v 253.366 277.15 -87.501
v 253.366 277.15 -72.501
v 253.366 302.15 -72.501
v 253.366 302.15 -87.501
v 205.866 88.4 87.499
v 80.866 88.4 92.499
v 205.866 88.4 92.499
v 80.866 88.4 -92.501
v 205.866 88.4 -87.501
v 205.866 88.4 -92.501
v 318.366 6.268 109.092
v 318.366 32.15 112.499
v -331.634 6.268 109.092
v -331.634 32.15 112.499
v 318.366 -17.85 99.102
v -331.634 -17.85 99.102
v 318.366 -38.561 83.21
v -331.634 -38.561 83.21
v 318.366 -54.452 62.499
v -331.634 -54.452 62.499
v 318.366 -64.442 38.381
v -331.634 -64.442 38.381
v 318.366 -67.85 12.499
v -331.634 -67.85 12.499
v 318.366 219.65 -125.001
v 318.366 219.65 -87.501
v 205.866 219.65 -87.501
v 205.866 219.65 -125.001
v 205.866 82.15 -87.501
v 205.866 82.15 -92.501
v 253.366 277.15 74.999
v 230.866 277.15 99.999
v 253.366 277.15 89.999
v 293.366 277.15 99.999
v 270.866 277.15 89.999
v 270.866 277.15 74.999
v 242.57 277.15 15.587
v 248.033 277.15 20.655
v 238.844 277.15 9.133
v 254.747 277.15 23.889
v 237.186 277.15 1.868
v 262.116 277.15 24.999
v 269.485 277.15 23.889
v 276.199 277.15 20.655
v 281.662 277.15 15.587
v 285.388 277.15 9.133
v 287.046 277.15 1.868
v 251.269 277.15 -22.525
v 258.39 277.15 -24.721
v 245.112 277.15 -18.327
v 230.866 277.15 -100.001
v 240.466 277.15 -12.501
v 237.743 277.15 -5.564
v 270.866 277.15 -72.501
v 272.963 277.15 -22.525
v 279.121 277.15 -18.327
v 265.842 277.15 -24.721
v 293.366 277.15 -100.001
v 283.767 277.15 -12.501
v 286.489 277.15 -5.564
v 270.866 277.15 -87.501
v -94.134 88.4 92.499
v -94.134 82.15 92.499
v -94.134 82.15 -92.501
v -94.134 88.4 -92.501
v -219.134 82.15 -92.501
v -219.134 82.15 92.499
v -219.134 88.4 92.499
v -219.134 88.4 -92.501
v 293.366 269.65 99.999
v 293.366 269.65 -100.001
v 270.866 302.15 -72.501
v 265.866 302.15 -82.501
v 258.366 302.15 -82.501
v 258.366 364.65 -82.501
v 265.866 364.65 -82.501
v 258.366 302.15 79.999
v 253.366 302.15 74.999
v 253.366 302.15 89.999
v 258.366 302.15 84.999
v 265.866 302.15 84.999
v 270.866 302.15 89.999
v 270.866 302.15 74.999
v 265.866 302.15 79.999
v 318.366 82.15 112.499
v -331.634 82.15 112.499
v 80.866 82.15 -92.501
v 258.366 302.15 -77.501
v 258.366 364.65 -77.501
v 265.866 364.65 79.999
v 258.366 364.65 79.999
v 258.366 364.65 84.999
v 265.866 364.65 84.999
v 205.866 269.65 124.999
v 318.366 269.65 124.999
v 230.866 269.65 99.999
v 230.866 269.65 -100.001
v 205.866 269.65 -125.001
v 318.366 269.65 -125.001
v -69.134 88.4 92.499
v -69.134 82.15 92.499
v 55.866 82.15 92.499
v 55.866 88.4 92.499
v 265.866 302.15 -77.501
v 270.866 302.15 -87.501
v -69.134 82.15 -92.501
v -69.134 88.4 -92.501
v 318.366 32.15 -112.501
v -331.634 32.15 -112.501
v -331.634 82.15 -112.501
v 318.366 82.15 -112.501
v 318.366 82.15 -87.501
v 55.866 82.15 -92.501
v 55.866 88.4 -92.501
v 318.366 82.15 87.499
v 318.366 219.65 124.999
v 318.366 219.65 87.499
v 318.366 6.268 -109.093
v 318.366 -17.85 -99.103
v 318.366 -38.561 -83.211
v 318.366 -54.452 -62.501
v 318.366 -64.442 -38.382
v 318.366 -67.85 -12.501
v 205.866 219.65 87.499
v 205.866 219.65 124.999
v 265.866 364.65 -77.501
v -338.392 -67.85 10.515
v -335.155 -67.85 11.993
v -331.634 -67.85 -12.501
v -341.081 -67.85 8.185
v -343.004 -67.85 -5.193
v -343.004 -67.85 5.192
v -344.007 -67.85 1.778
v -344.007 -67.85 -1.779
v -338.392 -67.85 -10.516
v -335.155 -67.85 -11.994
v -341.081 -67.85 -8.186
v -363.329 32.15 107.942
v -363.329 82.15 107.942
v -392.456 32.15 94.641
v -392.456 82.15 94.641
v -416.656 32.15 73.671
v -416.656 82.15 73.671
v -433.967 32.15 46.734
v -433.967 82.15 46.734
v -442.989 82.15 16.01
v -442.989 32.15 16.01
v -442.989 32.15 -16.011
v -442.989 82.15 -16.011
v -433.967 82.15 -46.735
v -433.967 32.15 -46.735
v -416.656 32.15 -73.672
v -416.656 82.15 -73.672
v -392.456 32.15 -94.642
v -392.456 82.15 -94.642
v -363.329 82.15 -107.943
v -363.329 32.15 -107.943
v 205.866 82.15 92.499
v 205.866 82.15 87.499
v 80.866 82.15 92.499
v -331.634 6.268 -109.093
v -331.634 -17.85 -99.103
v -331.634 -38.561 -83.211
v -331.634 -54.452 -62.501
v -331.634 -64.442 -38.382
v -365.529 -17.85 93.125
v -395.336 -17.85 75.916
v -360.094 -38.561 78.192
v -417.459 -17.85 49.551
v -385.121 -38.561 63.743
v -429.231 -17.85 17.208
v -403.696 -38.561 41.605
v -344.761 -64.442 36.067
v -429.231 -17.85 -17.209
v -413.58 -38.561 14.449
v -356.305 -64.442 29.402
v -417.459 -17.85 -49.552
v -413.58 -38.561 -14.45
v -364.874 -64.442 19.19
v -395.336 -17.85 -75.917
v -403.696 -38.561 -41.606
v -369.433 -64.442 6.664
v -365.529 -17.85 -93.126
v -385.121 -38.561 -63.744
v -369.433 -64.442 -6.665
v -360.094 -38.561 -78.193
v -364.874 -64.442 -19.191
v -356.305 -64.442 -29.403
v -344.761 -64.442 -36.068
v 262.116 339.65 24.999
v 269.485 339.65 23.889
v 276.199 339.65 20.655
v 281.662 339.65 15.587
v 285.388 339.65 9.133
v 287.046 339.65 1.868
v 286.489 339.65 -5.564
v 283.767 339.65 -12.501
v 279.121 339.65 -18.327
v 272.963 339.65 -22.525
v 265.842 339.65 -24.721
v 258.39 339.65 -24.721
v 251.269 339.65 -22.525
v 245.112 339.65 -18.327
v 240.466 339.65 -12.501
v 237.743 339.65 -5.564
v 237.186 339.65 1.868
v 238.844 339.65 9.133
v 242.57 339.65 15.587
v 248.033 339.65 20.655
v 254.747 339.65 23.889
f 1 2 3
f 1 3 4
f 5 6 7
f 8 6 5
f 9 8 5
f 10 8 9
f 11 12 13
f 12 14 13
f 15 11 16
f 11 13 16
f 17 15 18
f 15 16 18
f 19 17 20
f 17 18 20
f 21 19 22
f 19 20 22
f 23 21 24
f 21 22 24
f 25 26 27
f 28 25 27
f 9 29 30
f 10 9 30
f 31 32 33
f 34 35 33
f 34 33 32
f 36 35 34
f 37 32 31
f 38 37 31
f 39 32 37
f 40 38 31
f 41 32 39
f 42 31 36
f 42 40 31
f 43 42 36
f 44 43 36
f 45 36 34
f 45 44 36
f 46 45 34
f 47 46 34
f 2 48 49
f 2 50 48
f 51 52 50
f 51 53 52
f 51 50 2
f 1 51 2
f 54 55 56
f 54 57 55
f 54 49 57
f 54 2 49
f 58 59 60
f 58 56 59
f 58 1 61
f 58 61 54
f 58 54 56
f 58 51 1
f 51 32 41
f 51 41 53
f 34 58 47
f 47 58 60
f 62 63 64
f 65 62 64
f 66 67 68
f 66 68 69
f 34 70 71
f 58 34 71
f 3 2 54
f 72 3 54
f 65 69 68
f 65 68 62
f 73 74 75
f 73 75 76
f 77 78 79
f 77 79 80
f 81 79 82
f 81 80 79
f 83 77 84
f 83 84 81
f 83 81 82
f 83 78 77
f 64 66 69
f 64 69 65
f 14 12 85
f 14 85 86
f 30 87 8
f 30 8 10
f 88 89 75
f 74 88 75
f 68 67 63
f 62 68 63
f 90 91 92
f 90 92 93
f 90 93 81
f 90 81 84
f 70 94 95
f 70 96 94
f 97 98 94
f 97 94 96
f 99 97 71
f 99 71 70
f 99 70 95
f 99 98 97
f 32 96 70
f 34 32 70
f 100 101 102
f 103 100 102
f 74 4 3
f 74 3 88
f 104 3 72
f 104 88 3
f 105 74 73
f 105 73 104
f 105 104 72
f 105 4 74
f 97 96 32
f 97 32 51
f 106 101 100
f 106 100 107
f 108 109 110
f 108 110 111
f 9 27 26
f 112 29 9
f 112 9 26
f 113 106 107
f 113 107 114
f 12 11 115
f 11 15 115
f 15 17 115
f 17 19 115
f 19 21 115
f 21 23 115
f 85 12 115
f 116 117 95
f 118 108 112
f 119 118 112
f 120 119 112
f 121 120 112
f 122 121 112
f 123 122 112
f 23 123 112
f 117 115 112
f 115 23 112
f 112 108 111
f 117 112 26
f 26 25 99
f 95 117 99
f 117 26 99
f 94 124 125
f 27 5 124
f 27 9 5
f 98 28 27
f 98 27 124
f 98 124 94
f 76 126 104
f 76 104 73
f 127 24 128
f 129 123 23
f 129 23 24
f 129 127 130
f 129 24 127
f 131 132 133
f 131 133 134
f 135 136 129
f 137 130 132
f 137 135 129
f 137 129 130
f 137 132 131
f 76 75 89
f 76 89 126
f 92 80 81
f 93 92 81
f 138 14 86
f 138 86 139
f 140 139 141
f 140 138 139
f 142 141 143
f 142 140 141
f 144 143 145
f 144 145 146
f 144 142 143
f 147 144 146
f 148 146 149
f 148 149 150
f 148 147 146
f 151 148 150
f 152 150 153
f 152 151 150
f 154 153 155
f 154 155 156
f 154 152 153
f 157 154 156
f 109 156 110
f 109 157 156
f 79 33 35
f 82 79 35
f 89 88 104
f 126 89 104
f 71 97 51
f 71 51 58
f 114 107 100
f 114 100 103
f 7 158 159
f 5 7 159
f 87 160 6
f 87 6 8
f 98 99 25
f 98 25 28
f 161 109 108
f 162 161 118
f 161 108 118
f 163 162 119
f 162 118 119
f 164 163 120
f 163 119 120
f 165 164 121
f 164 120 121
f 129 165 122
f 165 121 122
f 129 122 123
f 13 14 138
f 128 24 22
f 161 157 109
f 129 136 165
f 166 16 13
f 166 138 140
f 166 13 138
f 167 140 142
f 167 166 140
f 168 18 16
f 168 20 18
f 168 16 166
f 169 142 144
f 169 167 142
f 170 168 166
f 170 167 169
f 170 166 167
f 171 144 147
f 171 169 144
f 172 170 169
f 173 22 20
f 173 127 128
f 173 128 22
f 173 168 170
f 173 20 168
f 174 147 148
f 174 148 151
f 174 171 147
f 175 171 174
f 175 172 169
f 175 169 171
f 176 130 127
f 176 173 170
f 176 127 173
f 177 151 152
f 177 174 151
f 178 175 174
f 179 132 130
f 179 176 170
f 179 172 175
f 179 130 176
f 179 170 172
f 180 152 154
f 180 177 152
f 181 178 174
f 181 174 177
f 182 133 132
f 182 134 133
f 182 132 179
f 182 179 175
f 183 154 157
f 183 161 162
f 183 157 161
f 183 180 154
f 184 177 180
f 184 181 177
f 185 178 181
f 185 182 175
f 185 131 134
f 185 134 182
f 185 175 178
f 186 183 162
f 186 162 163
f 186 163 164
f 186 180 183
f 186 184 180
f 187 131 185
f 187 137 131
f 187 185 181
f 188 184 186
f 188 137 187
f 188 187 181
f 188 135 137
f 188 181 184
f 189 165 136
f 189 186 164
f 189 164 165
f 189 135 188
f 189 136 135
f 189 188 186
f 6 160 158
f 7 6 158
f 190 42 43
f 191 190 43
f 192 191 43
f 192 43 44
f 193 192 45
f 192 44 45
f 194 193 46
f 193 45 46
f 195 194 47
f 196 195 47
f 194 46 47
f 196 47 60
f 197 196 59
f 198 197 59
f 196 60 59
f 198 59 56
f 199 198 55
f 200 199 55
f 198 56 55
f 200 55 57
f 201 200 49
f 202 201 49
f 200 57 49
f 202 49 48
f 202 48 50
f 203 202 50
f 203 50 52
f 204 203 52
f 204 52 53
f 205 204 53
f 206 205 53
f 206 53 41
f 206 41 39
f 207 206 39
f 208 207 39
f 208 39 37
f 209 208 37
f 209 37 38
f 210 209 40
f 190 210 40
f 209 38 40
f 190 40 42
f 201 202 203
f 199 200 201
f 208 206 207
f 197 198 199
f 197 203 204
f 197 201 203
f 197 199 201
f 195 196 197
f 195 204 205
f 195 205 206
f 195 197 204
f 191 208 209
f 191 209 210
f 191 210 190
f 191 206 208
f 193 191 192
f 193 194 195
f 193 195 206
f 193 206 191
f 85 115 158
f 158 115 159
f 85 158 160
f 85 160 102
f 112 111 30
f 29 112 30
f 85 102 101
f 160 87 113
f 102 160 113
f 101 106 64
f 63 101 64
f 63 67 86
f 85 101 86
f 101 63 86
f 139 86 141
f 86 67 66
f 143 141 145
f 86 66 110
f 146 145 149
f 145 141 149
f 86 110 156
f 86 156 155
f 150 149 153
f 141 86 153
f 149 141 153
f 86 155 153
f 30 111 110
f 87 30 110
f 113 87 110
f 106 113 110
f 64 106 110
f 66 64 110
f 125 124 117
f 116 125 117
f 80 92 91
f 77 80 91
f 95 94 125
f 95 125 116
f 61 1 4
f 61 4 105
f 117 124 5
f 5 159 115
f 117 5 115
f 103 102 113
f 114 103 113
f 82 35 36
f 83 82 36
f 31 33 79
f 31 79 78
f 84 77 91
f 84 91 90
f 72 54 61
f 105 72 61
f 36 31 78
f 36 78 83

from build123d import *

# Parameters (mm, degrees)
SALIENTE_EXTRUIR1_DEPTH  = 60
REDONDEO2_R              = 40
CROQUIS3_W               = 45
CROQUIS3_H               = 70
SALIENTE_EXTRUIR2_DEPTH  = 75
CROQUIS6_W               = 45
CROQUIS6_H               = 20
SALIENTE_EXTRUIR5_DEPTH  = 15
CROQUIS7_W               = 45
CROQUIS7_H               = 20
SALIENTE_EXTRUIR6_DEPTH  = 15
CROQUIS8_W               = 50
CROQUIS8_H               = 74
SALIENTE_EXTRUIR7_DEPTH  = 2.5
CROQUIS9_W               = 25
CROQUIS9_H               = 80
SALIENTE_EXTRUIR8_DEPTH  = 3
CROQUIS10_W              = 7
CROQUIS10_H              = 6
SALIENTE_EXTRUIR9_DEPTH  = 10
CROQUIS12_W              = 3
CROQUIS12_H              = 2
SALIENTE_EXTRUIR10_DEPTH = 25
MATRIZL1_COUNT           = 2
MATRIZL1_PITCH           = 65
CROQUIS13_R              = 10
SALIENTE_EXTRUIR11_DEPTH = 25
ESCALA3_SCALE            = 2.5


with BuildPart() as part:
    # Croquis2 → Saliente-Extruir1 (new body)
    with BuildSketch(Plane(origin=(0, 0, 0), x_dir=(1, 0, 0), z_dir=(0, 1, 0))):
        with BuildLine():
            Line((130, -45), (-130, -45))
            ThreePointArc((-130, -45), (-175, 0), (-130, 45))
            Line((-130, 45), (130, 45))
            Line((130, 45), (130, -45))
        make_face()
    extrude(amount=SALIENTE_EXTRUIR1_DEPTH)

    # Redondeo2
    redondeo2_edges = [part.edges().sort_by_distance(p)[0] for p in [
        (0, 0, -45),
        (0, 0, 45),
        (-175, 0, 0),
    ]]
    fillet(redondeo2_edges, radius=REDONDEO2_R)

    # Croquis3 → Saliente-Extruir2 (add)
    with BuildSketch(Plane(origin=(0, 60, 0), x_dir=(1, 0, 0), z_dir=(0, 1, 0))):
        with Locations((107.5, 0)):
            Rectangle(CROQUIS3_W, CROQUIS3_H)
    extrude(amount=SALIENTE_EXTRUIR2_DEPTH)

    # Croquis6 → Saliente-Extruir5 (add)
    with BuildSketch(Plane(origin=(0, 0, -35), x_dir=(-1, 0, 0), z_dir=(0, 0, -1))):
        with Locations((-107.5, 125)):
            Rectangle(CROQUIS6_W, CROQUIS6_H)
    extrude(amount=SALIENTE_EXTRUIR5_DEPTH)

    # Croquis7 → Saliente-Extruir6 (add)
    with BuildSketch(Plane.XY.offset(35)):
        with Locations((107.5, 125)):
            Rectangle(CROQUIS7_W, CROQUIS7_H)
    extrude(amount=SALIENTE_EXTRUIR6_DEPTH)

    # Croquis8 → Saliente-Extruir7 (add)
    with BuildSketch(Plane(origin=(0, 60, 0), x_dir=(1, 0, 0), z_dir=(0, 1, 0))):
        Rectangle(CROQUIS8_W, CROQUIS8_H)
        with Locations((-60, 0)):
            Rectangle(CROQUIS8_W, CROQUIS8_H)
        with Locations((60, 0)):
            Rectangle(CROQUIS8_W, CROQUIS8_H)
    extrude(amount=SALIENTE_EXTRUIR7_DEPTH)

    # Croquis9 → Saliente-Extruir8 (add)
    with BuildSketch(Plane(origin=(0, 135, 0), x_dir=(1, 0, 0), z_dir=(0, 1, 0))):
        with Locations((107.5, 0)):
            Rectangle(CROQUIS9_W, CROQUIS9_H)
    extrude(amount=SALIENTE_EXTRUIR8_DEPTH)

    # Croquis10 → Saliente-Extruir9 (add)
    with BuildSketch(Plane(origin=(0, 138, 0), x_dir=(1, 0, 0), z_dir=(0, 1, 0))):
        with Locations((107.5, -33)):
            Rectangle(CROQUIS10_W, CROQUIS10_H)
    saliente_extruir9 = extrude(amount=SALIENTE_EXTRUIR9_DEPTH)

    # Croquis12 → Saliente-Extruir10 (add)
    with BuildSketch(Plane(origin=(0, 148, 0), x_dir=(1, 0, 0), z_dir=(0, 1, 0))):
        with Locations((107.5, -33)):
            Rectangle(CROQUIS12_W, CROQUIS12_H)
    saliente_extruir10 = extrude(amount=SALIENTE_EXTRUIR10_DEPTH)

    # MatrizL1: Saliente-Extruir9, Saliente-Extruir10 ×2
    with Locations(*[(0, 0, -i * MATRIZL1_PITCH) for i in range(1, MATRIZL1_COUNT)]):
        add(saliente_extruir9)
        add(saliente_extruir10)

    # Croquis13 → Saliente-Extruir11 (add)
    with BuildSketch(Plane(origin=(0, 138, 0), x_dir=(1, 0, 0), z_dir=(0, 1, 0))):
        with Locations(Location((107.5, 0, 0), (0, 0, 270))):
            Circle(CROQUIS13_R)
    extrude(amount=SALIENTE_EXTRUIR11_DEPTH)


with BuildPart() as part_1:
    # Escala3: scaled about (4.422531692, 45.233244439, 0.000338602)
    add(part.part.scale(ESCALA3_SCALE).moved(Location((-6.633797538, -67.849866659, -0.000507903))))


solid = part_1.part
